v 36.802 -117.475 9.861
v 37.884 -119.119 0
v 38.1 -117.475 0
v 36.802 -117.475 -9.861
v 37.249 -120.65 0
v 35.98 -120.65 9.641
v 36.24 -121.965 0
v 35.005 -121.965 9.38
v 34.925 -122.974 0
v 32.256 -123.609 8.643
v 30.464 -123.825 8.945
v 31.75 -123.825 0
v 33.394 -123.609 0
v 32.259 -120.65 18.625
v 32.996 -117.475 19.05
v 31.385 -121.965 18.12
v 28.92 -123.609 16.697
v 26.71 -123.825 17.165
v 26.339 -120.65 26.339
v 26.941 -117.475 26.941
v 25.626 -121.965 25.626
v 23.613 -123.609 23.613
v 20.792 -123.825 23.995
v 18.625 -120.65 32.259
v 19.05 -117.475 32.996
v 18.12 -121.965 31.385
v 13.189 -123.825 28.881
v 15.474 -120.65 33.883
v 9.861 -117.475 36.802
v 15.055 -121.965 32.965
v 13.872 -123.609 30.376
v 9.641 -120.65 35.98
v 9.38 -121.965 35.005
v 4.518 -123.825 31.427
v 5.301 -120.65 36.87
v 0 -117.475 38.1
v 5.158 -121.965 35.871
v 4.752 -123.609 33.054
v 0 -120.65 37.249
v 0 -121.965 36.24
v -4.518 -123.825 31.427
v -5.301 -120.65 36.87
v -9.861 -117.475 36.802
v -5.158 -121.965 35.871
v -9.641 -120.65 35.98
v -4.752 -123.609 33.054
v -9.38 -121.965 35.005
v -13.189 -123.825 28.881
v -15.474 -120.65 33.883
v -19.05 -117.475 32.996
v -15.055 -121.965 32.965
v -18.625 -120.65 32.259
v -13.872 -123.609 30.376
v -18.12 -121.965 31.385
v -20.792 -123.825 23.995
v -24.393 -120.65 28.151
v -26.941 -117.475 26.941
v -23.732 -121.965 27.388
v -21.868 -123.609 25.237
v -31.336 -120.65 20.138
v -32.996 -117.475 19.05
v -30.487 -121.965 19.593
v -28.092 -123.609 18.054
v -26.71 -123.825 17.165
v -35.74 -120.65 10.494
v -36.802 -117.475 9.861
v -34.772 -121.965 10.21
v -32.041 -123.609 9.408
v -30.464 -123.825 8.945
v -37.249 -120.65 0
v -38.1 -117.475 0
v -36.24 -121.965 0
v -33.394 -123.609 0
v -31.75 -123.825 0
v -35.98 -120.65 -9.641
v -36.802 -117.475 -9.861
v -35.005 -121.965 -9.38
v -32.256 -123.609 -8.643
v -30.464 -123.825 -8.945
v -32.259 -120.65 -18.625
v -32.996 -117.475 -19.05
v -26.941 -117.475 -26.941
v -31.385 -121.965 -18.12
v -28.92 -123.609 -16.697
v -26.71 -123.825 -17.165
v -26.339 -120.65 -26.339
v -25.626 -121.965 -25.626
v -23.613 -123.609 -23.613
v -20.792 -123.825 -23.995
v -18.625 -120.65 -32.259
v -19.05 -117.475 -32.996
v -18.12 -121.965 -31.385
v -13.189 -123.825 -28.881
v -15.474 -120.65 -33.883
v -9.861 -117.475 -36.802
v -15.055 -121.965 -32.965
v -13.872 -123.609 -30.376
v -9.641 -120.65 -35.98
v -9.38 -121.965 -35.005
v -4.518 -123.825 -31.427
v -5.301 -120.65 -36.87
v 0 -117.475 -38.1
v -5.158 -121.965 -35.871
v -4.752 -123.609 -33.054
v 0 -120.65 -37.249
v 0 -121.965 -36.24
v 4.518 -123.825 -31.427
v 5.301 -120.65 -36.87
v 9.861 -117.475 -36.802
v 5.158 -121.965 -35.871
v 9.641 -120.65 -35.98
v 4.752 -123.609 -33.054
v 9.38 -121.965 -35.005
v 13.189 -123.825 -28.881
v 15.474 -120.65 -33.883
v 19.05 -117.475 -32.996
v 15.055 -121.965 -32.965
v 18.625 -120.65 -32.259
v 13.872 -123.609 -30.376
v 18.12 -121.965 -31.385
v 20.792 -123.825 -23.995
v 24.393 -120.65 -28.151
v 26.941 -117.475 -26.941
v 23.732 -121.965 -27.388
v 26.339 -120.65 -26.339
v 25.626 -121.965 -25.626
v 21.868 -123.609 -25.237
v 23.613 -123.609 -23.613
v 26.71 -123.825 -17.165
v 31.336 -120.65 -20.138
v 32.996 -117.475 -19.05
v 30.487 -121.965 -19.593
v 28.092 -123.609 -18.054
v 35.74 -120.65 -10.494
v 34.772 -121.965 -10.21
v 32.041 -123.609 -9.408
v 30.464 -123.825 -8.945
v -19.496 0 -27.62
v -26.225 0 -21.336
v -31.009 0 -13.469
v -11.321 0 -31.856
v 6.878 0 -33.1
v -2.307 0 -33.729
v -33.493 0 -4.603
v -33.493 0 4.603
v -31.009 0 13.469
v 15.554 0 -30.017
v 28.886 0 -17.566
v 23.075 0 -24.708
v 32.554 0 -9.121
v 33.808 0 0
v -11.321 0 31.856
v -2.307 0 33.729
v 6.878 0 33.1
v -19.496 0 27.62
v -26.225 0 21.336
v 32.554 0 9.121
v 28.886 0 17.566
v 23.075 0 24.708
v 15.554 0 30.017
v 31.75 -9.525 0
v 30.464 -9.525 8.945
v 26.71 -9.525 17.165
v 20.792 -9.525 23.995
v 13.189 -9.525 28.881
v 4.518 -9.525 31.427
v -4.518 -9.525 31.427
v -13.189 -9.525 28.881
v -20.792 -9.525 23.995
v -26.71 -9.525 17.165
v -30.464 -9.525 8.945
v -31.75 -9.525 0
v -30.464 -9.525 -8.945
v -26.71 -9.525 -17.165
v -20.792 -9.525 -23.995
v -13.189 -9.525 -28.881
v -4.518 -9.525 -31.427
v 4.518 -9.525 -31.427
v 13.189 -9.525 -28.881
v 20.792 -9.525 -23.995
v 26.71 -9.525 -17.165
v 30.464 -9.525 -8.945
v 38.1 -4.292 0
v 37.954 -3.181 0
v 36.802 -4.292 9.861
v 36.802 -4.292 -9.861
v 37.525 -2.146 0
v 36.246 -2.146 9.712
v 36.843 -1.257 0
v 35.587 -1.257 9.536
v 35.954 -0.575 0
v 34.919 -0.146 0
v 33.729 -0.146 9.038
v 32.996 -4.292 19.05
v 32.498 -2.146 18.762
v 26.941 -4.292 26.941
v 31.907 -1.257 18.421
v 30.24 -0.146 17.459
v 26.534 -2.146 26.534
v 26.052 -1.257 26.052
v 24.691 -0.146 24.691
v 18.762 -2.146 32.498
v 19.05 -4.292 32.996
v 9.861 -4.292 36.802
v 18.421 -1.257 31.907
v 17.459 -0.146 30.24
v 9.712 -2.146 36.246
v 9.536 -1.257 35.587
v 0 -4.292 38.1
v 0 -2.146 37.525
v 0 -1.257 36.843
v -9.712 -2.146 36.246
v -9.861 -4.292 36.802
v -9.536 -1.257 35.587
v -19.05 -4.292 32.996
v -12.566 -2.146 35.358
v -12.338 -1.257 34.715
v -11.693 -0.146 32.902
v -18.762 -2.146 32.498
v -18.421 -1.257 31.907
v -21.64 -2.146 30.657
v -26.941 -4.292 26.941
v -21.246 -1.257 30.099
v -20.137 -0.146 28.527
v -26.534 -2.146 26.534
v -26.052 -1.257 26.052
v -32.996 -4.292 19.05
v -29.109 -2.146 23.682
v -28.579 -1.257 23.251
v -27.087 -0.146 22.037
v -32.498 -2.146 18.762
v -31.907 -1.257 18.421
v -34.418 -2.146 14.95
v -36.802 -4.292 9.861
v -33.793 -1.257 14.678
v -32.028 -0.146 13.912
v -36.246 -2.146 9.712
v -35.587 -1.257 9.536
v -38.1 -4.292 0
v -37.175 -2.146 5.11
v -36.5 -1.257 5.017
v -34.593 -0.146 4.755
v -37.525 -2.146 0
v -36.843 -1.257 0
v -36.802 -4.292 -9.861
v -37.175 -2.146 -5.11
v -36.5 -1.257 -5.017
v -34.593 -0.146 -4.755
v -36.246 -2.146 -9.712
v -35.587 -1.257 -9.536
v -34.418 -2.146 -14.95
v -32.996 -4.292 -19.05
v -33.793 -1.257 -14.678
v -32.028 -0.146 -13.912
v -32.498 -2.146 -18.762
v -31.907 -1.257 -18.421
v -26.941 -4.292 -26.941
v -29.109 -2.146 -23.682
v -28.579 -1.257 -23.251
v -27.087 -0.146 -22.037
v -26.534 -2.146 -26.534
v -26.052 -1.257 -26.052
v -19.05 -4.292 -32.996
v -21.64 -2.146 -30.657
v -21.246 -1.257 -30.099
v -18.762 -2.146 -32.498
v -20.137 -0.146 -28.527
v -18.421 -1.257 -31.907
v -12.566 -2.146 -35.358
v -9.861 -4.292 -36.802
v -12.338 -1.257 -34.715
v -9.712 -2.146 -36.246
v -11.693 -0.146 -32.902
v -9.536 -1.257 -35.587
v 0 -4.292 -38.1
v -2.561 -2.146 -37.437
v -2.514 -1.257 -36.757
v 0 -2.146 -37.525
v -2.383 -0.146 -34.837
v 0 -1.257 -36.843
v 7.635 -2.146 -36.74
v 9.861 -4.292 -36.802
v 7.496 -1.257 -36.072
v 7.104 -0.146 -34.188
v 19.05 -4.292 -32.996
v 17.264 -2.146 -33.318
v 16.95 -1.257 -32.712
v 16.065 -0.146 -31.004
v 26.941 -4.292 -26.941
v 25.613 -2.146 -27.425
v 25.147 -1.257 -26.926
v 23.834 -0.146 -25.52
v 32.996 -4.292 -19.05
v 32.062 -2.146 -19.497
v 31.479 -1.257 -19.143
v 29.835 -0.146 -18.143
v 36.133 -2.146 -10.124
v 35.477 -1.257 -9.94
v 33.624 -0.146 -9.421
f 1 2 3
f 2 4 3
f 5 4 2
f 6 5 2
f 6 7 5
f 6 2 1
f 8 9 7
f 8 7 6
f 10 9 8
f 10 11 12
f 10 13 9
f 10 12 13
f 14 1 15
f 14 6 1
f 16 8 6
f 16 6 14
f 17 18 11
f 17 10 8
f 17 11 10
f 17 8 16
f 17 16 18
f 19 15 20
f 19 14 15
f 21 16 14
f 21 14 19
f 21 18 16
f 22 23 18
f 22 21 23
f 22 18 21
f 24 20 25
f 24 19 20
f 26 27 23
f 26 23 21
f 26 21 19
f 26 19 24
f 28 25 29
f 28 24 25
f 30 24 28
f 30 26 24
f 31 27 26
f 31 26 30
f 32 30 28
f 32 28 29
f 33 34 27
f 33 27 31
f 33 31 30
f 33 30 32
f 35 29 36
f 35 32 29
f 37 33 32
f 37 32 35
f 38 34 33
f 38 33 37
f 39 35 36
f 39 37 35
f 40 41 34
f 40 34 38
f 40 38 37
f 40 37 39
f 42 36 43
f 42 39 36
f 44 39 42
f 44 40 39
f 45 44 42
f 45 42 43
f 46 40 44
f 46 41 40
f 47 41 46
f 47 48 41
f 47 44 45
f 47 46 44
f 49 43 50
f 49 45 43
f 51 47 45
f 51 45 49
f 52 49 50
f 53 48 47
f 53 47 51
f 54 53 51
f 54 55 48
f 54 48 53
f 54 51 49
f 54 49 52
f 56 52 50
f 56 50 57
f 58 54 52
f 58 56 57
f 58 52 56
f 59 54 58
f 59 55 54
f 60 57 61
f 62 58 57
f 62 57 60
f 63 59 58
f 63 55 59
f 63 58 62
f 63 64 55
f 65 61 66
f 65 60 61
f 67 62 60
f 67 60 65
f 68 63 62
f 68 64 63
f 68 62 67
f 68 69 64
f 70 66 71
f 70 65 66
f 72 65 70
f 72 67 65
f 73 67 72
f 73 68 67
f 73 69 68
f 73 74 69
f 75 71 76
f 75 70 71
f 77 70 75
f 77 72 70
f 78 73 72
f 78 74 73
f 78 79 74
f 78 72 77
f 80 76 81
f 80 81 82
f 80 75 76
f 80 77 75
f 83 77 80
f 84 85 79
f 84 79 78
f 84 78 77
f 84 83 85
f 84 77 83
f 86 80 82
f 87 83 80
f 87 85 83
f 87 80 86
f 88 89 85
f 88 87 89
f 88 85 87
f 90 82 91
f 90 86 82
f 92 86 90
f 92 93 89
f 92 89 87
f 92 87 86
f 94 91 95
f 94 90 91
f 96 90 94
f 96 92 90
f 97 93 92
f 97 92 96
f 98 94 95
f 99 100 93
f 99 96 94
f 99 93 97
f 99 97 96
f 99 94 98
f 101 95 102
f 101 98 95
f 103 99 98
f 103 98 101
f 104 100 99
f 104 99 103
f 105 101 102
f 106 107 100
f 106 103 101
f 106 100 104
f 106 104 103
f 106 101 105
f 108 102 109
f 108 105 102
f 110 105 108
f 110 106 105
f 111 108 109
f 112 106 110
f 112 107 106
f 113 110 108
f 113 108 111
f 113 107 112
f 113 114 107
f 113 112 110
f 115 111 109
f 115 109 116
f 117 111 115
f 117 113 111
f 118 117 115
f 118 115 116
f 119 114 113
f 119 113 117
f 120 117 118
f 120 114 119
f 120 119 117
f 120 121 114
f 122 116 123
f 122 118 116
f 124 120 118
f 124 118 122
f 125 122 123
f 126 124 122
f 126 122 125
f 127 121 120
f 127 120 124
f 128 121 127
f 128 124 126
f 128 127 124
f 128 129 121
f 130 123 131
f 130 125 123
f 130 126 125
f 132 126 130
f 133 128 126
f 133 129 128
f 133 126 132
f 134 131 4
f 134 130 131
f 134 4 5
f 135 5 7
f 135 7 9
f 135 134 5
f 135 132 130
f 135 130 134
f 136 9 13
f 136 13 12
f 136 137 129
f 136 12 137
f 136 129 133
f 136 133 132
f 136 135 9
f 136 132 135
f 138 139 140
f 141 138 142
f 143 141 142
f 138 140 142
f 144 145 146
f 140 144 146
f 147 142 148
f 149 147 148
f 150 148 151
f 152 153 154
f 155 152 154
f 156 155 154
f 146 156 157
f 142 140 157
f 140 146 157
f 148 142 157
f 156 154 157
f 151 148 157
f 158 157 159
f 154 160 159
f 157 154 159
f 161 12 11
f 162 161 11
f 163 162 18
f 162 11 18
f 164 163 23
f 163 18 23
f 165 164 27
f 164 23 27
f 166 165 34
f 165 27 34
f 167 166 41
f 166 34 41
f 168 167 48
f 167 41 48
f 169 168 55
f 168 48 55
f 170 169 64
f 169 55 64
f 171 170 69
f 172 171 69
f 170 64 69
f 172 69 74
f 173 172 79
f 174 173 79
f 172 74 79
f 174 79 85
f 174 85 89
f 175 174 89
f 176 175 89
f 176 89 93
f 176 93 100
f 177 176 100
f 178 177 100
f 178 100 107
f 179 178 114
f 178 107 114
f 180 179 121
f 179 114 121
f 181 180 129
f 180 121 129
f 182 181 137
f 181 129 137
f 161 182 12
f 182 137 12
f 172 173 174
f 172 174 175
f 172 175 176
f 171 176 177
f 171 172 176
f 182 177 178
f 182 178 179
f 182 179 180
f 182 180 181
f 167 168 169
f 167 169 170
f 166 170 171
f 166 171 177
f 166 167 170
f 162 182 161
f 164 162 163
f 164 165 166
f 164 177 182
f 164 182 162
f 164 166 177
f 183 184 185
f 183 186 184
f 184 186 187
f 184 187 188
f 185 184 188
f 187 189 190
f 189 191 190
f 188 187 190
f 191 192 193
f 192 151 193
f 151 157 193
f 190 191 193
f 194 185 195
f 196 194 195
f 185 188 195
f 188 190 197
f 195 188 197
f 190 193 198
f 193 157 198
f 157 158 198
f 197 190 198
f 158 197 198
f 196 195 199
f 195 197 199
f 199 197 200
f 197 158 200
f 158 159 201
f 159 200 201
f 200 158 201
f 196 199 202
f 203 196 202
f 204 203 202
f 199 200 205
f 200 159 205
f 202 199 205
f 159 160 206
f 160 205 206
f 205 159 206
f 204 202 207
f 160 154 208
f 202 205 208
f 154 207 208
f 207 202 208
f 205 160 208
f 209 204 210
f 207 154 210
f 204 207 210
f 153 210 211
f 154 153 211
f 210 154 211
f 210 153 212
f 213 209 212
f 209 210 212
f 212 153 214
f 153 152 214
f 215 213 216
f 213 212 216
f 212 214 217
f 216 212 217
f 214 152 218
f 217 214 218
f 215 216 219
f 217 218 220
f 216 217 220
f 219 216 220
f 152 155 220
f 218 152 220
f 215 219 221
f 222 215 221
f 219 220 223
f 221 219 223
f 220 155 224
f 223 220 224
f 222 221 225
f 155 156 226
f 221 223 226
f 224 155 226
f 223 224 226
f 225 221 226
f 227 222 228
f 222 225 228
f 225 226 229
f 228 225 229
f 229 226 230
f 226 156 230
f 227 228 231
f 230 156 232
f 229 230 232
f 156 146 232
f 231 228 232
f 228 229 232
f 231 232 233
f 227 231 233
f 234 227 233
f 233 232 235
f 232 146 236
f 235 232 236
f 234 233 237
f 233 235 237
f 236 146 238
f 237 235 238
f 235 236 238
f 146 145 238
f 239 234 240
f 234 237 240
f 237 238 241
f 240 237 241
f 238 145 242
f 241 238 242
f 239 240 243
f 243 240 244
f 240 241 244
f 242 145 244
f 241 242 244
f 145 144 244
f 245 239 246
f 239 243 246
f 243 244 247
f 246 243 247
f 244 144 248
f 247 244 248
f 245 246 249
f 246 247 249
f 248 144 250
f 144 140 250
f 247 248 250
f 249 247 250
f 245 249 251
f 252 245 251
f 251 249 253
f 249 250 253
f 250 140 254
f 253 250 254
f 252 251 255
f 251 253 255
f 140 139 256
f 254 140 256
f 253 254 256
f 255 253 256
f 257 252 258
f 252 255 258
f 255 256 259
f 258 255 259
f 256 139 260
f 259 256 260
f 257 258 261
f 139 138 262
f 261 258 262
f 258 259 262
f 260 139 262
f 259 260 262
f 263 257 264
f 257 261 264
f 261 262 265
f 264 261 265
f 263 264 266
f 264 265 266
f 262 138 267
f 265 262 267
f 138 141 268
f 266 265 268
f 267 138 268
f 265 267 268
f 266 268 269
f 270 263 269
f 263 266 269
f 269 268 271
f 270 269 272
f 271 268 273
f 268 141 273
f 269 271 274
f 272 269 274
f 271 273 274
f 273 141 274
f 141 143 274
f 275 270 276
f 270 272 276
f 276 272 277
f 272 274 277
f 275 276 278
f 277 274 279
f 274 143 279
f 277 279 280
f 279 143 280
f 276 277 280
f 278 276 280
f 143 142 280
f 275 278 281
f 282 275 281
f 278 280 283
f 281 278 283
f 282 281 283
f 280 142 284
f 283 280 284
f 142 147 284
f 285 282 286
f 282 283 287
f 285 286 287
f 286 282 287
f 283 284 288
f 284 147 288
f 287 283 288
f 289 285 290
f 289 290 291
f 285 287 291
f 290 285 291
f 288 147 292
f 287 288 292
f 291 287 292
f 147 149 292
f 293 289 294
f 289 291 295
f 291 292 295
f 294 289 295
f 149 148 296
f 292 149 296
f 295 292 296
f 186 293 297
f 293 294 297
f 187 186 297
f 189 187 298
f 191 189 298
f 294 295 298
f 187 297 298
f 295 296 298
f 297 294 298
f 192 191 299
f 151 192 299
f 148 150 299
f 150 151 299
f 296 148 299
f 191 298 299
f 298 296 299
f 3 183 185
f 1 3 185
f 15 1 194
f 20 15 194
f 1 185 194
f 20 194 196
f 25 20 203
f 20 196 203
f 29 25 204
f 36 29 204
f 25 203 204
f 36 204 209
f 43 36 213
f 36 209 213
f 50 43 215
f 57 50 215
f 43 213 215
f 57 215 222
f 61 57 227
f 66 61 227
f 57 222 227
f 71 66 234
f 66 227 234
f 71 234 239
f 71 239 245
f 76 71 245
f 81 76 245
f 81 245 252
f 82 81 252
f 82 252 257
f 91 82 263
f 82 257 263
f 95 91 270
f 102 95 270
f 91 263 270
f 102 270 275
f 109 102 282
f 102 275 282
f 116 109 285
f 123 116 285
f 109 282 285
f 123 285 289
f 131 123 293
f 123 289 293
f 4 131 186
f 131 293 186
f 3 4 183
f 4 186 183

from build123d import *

# Parameters (mm, degrees)
F0_R      = 38.1
F1_DEPTH  = 123.825
F2_R      = 6.35
F1_FACE_R = 31.75
F3_DEPTH  = 114.3
F4_R      = 4.292472


with BuildPart() as f1:
    # F0 (on Front) → F1 (new body)
    with BuildSketch(Plane.XZ):
        Circle(F0_R)
    extrude(amount=F1_DEPTH)

    # F2
    f2_edges = [f1.edges().sort_by_distance(p)[0] for p in [
        (-38.1, -123.825, 0),
    ]]
    fillet(f2_edges, radius=F2_R)

    # F1_face (on face) → F3 (cut)
    with BuildSketch(Plane.XZ.offset(123.825)):
        Circle(F1_FACE_R)
    extrude(amount=-F3_DEPTH, mode=Mode.SUBTRACT)

    # F4
    f4_edges = [f1.edges().sort_by_distance(p)[0] for p in [
        (-38.1, 0, 0),
    ]]
    fillet(f4_edges, radius=F4_R)


solid = f1.part
